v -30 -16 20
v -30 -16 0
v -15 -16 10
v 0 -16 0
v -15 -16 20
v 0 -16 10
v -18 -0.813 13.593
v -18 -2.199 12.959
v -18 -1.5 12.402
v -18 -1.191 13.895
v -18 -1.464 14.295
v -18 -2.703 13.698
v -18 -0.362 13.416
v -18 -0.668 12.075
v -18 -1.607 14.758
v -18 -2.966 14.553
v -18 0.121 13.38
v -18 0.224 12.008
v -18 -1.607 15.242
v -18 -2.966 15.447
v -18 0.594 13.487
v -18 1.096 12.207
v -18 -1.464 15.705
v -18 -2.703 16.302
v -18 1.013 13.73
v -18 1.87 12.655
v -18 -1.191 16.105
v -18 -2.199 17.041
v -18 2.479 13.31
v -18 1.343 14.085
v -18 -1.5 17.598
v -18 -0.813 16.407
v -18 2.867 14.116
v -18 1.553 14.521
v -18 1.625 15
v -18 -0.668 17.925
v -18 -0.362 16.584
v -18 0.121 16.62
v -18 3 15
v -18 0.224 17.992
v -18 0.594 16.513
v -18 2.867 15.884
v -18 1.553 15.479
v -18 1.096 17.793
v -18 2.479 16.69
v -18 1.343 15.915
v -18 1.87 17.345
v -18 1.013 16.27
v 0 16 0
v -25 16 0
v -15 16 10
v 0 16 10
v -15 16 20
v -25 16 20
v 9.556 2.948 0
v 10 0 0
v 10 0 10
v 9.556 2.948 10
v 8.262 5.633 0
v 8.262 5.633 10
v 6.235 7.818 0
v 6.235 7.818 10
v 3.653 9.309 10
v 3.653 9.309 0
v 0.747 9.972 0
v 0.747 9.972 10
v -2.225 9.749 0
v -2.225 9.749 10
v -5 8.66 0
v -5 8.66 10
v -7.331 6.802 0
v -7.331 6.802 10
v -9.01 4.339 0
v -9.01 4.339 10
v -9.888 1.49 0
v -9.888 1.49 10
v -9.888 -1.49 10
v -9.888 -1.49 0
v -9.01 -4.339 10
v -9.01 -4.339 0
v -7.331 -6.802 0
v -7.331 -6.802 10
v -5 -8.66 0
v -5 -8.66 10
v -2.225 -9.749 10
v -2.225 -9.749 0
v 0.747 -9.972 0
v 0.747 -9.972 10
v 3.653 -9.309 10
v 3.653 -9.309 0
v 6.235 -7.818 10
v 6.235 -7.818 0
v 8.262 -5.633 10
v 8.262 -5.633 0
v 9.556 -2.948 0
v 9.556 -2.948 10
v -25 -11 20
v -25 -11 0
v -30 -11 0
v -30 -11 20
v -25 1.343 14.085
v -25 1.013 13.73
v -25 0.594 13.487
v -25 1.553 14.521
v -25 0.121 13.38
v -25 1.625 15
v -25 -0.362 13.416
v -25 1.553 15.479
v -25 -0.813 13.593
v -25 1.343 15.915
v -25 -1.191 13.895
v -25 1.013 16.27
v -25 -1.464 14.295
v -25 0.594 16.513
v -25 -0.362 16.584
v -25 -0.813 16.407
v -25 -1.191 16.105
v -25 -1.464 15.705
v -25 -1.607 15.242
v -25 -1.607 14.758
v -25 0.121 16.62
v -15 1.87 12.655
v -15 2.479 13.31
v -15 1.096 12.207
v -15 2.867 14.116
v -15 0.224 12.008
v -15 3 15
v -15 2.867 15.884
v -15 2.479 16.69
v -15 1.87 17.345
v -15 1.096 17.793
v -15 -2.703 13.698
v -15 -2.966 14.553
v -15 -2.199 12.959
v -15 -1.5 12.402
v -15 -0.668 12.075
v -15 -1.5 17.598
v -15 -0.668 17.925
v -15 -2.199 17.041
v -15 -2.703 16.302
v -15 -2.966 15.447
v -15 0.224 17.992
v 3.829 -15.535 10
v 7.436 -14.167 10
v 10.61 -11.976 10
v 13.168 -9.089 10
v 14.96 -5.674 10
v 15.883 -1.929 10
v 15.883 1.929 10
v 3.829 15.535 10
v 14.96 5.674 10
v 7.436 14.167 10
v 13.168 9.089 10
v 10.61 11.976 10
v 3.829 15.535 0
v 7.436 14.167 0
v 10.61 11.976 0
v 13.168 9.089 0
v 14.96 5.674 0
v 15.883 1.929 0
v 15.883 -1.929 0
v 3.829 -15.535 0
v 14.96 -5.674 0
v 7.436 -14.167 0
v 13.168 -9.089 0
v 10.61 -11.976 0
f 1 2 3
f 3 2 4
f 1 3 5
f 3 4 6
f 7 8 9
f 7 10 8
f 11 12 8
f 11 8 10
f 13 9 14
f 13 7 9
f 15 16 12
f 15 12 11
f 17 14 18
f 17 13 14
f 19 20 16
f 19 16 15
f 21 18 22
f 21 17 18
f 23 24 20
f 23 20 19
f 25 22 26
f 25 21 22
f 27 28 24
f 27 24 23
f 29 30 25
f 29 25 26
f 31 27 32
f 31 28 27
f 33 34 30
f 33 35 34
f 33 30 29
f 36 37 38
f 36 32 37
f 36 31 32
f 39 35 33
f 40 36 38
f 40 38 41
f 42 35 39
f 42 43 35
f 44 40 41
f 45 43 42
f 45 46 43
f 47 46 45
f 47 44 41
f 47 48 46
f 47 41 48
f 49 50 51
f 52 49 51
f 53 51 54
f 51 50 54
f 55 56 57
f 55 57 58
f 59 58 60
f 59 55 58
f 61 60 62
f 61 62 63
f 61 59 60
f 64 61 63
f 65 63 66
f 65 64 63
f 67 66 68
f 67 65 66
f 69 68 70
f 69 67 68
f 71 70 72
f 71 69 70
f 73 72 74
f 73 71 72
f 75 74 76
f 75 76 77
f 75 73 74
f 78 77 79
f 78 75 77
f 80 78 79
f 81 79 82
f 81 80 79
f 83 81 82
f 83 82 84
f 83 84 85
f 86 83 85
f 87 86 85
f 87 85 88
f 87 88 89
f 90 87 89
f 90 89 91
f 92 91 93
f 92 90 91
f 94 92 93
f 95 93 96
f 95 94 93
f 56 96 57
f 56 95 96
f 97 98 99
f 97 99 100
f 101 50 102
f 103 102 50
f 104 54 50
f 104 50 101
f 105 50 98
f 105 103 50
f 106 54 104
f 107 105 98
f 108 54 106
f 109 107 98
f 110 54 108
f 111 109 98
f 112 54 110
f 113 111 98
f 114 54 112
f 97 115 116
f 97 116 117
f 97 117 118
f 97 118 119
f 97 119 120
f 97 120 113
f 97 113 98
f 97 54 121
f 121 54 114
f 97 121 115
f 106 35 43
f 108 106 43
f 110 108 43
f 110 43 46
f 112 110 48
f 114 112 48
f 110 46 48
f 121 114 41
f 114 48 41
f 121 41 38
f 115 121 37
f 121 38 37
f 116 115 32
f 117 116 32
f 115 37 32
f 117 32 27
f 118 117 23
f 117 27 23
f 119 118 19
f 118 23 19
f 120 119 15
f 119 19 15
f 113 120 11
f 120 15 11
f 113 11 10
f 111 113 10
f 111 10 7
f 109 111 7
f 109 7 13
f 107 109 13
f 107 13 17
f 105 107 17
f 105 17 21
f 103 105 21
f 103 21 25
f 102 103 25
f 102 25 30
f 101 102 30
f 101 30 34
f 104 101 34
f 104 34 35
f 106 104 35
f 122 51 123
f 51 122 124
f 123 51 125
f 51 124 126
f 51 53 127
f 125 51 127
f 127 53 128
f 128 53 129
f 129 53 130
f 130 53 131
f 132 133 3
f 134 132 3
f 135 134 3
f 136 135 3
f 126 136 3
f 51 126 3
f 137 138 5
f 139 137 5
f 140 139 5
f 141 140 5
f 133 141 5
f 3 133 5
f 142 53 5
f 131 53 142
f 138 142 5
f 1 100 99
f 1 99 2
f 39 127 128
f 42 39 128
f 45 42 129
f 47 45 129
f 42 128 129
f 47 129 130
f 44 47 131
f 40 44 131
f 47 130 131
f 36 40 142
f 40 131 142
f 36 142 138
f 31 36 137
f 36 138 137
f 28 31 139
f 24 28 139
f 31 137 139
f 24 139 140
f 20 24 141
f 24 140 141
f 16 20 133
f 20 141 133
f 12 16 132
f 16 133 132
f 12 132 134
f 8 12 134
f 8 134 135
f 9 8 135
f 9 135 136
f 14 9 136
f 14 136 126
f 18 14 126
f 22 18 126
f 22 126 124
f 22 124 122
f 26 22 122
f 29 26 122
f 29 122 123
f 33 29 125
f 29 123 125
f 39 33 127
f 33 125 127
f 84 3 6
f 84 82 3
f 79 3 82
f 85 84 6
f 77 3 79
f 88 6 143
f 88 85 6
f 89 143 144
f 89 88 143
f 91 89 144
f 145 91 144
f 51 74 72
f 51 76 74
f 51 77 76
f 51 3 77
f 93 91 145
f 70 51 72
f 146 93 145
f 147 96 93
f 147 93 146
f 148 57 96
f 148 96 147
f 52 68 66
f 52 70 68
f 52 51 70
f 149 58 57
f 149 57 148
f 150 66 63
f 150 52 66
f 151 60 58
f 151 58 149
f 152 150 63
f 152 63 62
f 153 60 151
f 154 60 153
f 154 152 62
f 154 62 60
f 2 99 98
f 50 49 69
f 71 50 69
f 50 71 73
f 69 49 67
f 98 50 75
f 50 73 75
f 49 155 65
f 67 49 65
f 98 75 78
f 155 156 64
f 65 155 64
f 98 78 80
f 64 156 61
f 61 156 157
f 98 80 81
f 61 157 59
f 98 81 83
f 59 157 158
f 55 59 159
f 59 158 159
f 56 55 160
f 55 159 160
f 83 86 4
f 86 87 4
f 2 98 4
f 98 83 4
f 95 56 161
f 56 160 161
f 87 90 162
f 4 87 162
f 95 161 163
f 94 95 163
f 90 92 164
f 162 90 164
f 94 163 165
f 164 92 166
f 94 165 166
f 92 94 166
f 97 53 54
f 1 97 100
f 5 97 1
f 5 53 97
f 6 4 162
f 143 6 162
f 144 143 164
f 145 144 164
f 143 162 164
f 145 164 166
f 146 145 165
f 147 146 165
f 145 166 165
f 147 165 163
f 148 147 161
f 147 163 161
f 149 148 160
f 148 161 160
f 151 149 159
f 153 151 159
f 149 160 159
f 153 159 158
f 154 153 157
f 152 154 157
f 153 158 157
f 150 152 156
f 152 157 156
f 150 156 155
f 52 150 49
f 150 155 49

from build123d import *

# Parameters (mm, degrees)
F0_R     = 10
F1_DEPTH = 10
F2_W     = 32
F2_H     = 10
F3_DEPTH = 10
F4_R     = 1.625
F5_DEPTH = 25
F6_R     = 3
F7_DEPTH = 3
F8_W     = 5
F8_H     = 20
F9_DEPTH = 5


with BuildPart() as f1:
    # F0 (on Top) → F1 (new body)
    with BuildSketch(Plane.XY):
        with BuildLine():
            Line((-25, -16), (0, -16))
            ThreePointArc((0, -16), (16, 0), (0, 16))
            Line((0, 16), (-25, 16))
            Line((-25, 16), (-25, -16))
        make_face()
        Circle(F0_R, mode=Mode.SUBTRACT)
    extrude(amount=F1_DEPTH)

    # F2 (on face) → F3 (join)
    with BuildSketch(Plane(origin=(-25, 0, 0), x_dir=(0, -1, 0), z_dir=(-1, 0, 0))):
        with Locations((0, 15)):
            Rectangle(F2_W, F2_H)
    extrude(amount=-F3_DEPTH)

    # F4 (on face) → F5 (cut)
    with BuildSketch(Plane.YZ.offset(-15)):
        with Locations((0, 15)):
            Circle(F4_R)
    extrude(amount=-F5_DEPTH, mode=Mode.SUBTRACT)

    # F6 (on face) → F7 (cut)
    with BuildSketch(Plane.YZ.offset(-15)):
        with Locations((0, 15)):
            Circle(F6_R)
    extrude(amount=-F7_DEPTH, mode=Mode.SUBTRACT)

    # F8 (on face) → F9 (join)
    with BuildSketch(Plane(origin=(-25, 0, 0), x_dir=(0, -1, 0), z_dir=(-1, 0, 0))):
        with Locations((13.5, 10)):
            Rectangle(F8_W, F8_H)
    extrude(amount=F9_DEPTH)


solid = f1.part
